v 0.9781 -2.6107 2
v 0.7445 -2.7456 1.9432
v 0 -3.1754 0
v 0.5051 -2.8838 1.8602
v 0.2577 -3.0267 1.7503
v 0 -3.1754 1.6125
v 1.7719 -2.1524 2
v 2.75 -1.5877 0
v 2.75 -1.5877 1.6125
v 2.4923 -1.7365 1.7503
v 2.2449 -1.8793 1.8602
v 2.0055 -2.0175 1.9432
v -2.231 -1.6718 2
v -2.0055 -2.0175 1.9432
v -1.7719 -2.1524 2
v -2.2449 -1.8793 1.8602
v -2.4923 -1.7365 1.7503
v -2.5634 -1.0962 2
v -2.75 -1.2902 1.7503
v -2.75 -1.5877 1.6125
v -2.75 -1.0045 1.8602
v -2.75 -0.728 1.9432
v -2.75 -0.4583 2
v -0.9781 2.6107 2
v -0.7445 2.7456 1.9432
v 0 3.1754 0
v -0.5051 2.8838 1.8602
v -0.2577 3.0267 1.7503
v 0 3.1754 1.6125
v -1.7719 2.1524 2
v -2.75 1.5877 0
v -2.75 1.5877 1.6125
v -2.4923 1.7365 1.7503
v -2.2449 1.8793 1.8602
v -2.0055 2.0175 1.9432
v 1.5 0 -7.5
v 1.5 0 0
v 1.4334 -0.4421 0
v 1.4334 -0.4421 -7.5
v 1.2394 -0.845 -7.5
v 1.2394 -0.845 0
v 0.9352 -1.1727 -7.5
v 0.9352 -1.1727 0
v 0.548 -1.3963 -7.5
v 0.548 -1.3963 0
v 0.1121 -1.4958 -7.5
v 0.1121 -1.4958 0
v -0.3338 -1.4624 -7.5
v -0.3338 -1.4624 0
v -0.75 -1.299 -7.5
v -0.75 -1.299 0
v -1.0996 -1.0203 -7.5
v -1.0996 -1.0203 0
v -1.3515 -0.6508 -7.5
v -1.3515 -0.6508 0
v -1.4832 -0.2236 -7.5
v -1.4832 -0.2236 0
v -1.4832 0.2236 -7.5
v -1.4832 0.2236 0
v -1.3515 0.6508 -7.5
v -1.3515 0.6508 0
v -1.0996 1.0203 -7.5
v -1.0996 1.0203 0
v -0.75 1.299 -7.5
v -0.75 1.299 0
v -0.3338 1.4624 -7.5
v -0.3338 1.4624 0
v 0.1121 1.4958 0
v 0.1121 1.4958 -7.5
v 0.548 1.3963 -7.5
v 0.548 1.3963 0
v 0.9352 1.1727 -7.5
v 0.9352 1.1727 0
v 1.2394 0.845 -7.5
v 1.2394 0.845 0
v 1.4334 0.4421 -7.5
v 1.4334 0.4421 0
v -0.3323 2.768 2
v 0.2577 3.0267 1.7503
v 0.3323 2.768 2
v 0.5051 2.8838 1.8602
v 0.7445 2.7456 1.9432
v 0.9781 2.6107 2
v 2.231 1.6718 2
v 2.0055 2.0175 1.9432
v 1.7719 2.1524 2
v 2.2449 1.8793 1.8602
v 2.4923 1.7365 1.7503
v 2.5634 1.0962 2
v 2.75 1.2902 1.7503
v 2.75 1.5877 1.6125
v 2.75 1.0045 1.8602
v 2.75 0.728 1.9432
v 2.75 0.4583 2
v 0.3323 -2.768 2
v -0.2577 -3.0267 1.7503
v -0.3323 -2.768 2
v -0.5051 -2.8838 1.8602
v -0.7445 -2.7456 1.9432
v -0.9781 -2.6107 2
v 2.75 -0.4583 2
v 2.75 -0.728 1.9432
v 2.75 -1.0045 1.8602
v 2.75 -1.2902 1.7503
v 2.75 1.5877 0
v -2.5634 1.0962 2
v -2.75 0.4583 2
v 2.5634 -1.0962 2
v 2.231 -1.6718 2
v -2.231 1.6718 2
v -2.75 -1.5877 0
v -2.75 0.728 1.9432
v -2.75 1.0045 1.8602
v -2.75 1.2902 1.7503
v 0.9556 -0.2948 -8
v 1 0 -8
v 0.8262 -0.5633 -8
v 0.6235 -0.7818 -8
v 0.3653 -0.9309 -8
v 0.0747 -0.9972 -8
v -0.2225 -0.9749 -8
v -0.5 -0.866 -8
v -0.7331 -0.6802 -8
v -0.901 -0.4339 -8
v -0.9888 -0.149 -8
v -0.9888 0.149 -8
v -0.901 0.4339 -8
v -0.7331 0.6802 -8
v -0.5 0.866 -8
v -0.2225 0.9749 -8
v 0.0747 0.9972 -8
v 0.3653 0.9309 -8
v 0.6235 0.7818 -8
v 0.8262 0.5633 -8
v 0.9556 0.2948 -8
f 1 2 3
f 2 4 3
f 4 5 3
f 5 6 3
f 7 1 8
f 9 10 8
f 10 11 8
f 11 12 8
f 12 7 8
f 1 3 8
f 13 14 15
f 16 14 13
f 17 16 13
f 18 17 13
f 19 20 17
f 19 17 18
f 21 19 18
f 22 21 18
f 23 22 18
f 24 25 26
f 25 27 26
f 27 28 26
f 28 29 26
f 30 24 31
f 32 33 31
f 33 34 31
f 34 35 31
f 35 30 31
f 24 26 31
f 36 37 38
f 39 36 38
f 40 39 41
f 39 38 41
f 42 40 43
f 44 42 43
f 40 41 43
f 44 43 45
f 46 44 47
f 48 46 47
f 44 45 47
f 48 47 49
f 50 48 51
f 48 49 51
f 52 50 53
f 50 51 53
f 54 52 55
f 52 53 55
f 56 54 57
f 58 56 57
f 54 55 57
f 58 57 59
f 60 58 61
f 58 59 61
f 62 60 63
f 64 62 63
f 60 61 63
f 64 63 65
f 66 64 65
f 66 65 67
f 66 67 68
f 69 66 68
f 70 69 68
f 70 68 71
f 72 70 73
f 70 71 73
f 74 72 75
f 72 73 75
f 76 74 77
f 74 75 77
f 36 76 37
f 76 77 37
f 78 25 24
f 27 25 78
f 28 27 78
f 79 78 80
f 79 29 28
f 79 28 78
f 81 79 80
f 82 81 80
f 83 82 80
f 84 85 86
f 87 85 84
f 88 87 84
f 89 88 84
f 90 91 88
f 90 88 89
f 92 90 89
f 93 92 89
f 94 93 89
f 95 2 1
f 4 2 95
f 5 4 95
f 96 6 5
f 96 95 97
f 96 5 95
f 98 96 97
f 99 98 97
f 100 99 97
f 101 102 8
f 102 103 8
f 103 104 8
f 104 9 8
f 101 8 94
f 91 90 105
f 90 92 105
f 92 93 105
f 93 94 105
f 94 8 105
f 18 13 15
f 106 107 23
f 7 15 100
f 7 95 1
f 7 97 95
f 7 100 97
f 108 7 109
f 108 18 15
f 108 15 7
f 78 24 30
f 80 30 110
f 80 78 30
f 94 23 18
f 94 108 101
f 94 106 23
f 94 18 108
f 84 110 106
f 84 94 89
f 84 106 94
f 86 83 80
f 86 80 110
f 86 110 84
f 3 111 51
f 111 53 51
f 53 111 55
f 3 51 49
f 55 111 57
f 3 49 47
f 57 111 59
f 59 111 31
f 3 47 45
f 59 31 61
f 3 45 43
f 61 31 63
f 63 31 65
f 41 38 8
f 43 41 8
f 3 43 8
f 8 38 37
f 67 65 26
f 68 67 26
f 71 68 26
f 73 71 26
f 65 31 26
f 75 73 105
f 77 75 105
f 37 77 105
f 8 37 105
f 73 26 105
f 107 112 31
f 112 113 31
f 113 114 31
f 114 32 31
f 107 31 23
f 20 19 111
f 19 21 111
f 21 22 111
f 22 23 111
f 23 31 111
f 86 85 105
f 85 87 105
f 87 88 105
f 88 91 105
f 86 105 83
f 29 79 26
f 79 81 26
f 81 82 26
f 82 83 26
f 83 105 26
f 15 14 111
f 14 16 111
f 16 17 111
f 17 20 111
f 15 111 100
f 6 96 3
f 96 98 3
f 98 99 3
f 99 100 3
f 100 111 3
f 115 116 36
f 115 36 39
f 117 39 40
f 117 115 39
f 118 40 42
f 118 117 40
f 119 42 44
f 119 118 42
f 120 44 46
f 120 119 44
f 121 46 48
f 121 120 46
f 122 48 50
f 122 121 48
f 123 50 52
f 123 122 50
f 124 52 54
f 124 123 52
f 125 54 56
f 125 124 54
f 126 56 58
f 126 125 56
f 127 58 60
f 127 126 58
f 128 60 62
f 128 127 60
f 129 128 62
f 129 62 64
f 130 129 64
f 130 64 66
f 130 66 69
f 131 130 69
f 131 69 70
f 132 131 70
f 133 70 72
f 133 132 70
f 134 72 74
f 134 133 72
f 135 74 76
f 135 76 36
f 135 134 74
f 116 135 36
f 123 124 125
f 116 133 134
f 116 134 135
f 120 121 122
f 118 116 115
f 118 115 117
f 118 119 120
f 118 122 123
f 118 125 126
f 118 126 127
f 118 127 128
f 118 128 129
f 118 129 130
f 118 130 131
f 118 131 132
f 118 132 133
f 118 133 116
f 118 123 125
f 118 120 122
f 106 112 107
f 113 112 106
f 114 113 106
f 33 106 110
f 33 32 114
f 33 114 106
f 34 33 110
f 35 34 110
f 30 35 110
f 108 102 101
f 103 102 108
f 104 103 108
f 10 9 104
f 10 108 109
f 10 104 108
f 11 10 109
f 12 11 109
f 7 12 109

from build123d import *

# Parameters (mm, degrees)
EXTRUDE_1_DEPTH = 2
SKETCH_2_R      = 1.5
EXTRUDE_2_DEPTH = 8
CHAMFER_1_SIZE  = 0.5


with BuildPart() as part:
    # Эскиз1 → Вытянуть1 (new body)
    with BuildSketch(Plane.XY):
        Polygon((0, 3.175426481), (-2.75, 1.58771324), (-2.75, -1.58771324), (0, -3.175426481), (2.75, -1.58771324), (2.75, 1.58771324), align=None)
    extrude(amount=EXTRUDE_1_DEPTH)

    # Эскиз2 → Вытянуть2 (add)
    with BuildSketch(Plane(origin=(0, 0, 0), x_dir=(-1, 0, 0), z_dir=(0, 0, -1))):
        with Locations(Location((0, 0, 0), (0, 0, 180))):
            Circle(SKETCH_2_R)
    extrude(amount=EXTRUDE_2_DEPTH)

    # Эскиз15 → Вырез-Повернуть1 (revolve, cut)
    with BuildSketch(Plane(origin=(0, 0, 0), x_dir=(0, 0, -1), z_dir=(1, 0, 0))):
        Polygon((-2, 3.175426481), (-2, 2.787926481), (-1.6125, 3.175426481), align=None)
    revolve(axis=Axis((0, 0, 4.465296569), (0, 0, -1)), mode=Mode.SUBTRACT)

    # Фаска1
    chamfer_1_edges = [part.edges().sort_by_distance(p)[0] for p in [
        (-1.5, 0, -8),
    ]]
    chamfer(chamfer_1_edges, length=CHAMFER_1_SIZE)


solid = part.part
